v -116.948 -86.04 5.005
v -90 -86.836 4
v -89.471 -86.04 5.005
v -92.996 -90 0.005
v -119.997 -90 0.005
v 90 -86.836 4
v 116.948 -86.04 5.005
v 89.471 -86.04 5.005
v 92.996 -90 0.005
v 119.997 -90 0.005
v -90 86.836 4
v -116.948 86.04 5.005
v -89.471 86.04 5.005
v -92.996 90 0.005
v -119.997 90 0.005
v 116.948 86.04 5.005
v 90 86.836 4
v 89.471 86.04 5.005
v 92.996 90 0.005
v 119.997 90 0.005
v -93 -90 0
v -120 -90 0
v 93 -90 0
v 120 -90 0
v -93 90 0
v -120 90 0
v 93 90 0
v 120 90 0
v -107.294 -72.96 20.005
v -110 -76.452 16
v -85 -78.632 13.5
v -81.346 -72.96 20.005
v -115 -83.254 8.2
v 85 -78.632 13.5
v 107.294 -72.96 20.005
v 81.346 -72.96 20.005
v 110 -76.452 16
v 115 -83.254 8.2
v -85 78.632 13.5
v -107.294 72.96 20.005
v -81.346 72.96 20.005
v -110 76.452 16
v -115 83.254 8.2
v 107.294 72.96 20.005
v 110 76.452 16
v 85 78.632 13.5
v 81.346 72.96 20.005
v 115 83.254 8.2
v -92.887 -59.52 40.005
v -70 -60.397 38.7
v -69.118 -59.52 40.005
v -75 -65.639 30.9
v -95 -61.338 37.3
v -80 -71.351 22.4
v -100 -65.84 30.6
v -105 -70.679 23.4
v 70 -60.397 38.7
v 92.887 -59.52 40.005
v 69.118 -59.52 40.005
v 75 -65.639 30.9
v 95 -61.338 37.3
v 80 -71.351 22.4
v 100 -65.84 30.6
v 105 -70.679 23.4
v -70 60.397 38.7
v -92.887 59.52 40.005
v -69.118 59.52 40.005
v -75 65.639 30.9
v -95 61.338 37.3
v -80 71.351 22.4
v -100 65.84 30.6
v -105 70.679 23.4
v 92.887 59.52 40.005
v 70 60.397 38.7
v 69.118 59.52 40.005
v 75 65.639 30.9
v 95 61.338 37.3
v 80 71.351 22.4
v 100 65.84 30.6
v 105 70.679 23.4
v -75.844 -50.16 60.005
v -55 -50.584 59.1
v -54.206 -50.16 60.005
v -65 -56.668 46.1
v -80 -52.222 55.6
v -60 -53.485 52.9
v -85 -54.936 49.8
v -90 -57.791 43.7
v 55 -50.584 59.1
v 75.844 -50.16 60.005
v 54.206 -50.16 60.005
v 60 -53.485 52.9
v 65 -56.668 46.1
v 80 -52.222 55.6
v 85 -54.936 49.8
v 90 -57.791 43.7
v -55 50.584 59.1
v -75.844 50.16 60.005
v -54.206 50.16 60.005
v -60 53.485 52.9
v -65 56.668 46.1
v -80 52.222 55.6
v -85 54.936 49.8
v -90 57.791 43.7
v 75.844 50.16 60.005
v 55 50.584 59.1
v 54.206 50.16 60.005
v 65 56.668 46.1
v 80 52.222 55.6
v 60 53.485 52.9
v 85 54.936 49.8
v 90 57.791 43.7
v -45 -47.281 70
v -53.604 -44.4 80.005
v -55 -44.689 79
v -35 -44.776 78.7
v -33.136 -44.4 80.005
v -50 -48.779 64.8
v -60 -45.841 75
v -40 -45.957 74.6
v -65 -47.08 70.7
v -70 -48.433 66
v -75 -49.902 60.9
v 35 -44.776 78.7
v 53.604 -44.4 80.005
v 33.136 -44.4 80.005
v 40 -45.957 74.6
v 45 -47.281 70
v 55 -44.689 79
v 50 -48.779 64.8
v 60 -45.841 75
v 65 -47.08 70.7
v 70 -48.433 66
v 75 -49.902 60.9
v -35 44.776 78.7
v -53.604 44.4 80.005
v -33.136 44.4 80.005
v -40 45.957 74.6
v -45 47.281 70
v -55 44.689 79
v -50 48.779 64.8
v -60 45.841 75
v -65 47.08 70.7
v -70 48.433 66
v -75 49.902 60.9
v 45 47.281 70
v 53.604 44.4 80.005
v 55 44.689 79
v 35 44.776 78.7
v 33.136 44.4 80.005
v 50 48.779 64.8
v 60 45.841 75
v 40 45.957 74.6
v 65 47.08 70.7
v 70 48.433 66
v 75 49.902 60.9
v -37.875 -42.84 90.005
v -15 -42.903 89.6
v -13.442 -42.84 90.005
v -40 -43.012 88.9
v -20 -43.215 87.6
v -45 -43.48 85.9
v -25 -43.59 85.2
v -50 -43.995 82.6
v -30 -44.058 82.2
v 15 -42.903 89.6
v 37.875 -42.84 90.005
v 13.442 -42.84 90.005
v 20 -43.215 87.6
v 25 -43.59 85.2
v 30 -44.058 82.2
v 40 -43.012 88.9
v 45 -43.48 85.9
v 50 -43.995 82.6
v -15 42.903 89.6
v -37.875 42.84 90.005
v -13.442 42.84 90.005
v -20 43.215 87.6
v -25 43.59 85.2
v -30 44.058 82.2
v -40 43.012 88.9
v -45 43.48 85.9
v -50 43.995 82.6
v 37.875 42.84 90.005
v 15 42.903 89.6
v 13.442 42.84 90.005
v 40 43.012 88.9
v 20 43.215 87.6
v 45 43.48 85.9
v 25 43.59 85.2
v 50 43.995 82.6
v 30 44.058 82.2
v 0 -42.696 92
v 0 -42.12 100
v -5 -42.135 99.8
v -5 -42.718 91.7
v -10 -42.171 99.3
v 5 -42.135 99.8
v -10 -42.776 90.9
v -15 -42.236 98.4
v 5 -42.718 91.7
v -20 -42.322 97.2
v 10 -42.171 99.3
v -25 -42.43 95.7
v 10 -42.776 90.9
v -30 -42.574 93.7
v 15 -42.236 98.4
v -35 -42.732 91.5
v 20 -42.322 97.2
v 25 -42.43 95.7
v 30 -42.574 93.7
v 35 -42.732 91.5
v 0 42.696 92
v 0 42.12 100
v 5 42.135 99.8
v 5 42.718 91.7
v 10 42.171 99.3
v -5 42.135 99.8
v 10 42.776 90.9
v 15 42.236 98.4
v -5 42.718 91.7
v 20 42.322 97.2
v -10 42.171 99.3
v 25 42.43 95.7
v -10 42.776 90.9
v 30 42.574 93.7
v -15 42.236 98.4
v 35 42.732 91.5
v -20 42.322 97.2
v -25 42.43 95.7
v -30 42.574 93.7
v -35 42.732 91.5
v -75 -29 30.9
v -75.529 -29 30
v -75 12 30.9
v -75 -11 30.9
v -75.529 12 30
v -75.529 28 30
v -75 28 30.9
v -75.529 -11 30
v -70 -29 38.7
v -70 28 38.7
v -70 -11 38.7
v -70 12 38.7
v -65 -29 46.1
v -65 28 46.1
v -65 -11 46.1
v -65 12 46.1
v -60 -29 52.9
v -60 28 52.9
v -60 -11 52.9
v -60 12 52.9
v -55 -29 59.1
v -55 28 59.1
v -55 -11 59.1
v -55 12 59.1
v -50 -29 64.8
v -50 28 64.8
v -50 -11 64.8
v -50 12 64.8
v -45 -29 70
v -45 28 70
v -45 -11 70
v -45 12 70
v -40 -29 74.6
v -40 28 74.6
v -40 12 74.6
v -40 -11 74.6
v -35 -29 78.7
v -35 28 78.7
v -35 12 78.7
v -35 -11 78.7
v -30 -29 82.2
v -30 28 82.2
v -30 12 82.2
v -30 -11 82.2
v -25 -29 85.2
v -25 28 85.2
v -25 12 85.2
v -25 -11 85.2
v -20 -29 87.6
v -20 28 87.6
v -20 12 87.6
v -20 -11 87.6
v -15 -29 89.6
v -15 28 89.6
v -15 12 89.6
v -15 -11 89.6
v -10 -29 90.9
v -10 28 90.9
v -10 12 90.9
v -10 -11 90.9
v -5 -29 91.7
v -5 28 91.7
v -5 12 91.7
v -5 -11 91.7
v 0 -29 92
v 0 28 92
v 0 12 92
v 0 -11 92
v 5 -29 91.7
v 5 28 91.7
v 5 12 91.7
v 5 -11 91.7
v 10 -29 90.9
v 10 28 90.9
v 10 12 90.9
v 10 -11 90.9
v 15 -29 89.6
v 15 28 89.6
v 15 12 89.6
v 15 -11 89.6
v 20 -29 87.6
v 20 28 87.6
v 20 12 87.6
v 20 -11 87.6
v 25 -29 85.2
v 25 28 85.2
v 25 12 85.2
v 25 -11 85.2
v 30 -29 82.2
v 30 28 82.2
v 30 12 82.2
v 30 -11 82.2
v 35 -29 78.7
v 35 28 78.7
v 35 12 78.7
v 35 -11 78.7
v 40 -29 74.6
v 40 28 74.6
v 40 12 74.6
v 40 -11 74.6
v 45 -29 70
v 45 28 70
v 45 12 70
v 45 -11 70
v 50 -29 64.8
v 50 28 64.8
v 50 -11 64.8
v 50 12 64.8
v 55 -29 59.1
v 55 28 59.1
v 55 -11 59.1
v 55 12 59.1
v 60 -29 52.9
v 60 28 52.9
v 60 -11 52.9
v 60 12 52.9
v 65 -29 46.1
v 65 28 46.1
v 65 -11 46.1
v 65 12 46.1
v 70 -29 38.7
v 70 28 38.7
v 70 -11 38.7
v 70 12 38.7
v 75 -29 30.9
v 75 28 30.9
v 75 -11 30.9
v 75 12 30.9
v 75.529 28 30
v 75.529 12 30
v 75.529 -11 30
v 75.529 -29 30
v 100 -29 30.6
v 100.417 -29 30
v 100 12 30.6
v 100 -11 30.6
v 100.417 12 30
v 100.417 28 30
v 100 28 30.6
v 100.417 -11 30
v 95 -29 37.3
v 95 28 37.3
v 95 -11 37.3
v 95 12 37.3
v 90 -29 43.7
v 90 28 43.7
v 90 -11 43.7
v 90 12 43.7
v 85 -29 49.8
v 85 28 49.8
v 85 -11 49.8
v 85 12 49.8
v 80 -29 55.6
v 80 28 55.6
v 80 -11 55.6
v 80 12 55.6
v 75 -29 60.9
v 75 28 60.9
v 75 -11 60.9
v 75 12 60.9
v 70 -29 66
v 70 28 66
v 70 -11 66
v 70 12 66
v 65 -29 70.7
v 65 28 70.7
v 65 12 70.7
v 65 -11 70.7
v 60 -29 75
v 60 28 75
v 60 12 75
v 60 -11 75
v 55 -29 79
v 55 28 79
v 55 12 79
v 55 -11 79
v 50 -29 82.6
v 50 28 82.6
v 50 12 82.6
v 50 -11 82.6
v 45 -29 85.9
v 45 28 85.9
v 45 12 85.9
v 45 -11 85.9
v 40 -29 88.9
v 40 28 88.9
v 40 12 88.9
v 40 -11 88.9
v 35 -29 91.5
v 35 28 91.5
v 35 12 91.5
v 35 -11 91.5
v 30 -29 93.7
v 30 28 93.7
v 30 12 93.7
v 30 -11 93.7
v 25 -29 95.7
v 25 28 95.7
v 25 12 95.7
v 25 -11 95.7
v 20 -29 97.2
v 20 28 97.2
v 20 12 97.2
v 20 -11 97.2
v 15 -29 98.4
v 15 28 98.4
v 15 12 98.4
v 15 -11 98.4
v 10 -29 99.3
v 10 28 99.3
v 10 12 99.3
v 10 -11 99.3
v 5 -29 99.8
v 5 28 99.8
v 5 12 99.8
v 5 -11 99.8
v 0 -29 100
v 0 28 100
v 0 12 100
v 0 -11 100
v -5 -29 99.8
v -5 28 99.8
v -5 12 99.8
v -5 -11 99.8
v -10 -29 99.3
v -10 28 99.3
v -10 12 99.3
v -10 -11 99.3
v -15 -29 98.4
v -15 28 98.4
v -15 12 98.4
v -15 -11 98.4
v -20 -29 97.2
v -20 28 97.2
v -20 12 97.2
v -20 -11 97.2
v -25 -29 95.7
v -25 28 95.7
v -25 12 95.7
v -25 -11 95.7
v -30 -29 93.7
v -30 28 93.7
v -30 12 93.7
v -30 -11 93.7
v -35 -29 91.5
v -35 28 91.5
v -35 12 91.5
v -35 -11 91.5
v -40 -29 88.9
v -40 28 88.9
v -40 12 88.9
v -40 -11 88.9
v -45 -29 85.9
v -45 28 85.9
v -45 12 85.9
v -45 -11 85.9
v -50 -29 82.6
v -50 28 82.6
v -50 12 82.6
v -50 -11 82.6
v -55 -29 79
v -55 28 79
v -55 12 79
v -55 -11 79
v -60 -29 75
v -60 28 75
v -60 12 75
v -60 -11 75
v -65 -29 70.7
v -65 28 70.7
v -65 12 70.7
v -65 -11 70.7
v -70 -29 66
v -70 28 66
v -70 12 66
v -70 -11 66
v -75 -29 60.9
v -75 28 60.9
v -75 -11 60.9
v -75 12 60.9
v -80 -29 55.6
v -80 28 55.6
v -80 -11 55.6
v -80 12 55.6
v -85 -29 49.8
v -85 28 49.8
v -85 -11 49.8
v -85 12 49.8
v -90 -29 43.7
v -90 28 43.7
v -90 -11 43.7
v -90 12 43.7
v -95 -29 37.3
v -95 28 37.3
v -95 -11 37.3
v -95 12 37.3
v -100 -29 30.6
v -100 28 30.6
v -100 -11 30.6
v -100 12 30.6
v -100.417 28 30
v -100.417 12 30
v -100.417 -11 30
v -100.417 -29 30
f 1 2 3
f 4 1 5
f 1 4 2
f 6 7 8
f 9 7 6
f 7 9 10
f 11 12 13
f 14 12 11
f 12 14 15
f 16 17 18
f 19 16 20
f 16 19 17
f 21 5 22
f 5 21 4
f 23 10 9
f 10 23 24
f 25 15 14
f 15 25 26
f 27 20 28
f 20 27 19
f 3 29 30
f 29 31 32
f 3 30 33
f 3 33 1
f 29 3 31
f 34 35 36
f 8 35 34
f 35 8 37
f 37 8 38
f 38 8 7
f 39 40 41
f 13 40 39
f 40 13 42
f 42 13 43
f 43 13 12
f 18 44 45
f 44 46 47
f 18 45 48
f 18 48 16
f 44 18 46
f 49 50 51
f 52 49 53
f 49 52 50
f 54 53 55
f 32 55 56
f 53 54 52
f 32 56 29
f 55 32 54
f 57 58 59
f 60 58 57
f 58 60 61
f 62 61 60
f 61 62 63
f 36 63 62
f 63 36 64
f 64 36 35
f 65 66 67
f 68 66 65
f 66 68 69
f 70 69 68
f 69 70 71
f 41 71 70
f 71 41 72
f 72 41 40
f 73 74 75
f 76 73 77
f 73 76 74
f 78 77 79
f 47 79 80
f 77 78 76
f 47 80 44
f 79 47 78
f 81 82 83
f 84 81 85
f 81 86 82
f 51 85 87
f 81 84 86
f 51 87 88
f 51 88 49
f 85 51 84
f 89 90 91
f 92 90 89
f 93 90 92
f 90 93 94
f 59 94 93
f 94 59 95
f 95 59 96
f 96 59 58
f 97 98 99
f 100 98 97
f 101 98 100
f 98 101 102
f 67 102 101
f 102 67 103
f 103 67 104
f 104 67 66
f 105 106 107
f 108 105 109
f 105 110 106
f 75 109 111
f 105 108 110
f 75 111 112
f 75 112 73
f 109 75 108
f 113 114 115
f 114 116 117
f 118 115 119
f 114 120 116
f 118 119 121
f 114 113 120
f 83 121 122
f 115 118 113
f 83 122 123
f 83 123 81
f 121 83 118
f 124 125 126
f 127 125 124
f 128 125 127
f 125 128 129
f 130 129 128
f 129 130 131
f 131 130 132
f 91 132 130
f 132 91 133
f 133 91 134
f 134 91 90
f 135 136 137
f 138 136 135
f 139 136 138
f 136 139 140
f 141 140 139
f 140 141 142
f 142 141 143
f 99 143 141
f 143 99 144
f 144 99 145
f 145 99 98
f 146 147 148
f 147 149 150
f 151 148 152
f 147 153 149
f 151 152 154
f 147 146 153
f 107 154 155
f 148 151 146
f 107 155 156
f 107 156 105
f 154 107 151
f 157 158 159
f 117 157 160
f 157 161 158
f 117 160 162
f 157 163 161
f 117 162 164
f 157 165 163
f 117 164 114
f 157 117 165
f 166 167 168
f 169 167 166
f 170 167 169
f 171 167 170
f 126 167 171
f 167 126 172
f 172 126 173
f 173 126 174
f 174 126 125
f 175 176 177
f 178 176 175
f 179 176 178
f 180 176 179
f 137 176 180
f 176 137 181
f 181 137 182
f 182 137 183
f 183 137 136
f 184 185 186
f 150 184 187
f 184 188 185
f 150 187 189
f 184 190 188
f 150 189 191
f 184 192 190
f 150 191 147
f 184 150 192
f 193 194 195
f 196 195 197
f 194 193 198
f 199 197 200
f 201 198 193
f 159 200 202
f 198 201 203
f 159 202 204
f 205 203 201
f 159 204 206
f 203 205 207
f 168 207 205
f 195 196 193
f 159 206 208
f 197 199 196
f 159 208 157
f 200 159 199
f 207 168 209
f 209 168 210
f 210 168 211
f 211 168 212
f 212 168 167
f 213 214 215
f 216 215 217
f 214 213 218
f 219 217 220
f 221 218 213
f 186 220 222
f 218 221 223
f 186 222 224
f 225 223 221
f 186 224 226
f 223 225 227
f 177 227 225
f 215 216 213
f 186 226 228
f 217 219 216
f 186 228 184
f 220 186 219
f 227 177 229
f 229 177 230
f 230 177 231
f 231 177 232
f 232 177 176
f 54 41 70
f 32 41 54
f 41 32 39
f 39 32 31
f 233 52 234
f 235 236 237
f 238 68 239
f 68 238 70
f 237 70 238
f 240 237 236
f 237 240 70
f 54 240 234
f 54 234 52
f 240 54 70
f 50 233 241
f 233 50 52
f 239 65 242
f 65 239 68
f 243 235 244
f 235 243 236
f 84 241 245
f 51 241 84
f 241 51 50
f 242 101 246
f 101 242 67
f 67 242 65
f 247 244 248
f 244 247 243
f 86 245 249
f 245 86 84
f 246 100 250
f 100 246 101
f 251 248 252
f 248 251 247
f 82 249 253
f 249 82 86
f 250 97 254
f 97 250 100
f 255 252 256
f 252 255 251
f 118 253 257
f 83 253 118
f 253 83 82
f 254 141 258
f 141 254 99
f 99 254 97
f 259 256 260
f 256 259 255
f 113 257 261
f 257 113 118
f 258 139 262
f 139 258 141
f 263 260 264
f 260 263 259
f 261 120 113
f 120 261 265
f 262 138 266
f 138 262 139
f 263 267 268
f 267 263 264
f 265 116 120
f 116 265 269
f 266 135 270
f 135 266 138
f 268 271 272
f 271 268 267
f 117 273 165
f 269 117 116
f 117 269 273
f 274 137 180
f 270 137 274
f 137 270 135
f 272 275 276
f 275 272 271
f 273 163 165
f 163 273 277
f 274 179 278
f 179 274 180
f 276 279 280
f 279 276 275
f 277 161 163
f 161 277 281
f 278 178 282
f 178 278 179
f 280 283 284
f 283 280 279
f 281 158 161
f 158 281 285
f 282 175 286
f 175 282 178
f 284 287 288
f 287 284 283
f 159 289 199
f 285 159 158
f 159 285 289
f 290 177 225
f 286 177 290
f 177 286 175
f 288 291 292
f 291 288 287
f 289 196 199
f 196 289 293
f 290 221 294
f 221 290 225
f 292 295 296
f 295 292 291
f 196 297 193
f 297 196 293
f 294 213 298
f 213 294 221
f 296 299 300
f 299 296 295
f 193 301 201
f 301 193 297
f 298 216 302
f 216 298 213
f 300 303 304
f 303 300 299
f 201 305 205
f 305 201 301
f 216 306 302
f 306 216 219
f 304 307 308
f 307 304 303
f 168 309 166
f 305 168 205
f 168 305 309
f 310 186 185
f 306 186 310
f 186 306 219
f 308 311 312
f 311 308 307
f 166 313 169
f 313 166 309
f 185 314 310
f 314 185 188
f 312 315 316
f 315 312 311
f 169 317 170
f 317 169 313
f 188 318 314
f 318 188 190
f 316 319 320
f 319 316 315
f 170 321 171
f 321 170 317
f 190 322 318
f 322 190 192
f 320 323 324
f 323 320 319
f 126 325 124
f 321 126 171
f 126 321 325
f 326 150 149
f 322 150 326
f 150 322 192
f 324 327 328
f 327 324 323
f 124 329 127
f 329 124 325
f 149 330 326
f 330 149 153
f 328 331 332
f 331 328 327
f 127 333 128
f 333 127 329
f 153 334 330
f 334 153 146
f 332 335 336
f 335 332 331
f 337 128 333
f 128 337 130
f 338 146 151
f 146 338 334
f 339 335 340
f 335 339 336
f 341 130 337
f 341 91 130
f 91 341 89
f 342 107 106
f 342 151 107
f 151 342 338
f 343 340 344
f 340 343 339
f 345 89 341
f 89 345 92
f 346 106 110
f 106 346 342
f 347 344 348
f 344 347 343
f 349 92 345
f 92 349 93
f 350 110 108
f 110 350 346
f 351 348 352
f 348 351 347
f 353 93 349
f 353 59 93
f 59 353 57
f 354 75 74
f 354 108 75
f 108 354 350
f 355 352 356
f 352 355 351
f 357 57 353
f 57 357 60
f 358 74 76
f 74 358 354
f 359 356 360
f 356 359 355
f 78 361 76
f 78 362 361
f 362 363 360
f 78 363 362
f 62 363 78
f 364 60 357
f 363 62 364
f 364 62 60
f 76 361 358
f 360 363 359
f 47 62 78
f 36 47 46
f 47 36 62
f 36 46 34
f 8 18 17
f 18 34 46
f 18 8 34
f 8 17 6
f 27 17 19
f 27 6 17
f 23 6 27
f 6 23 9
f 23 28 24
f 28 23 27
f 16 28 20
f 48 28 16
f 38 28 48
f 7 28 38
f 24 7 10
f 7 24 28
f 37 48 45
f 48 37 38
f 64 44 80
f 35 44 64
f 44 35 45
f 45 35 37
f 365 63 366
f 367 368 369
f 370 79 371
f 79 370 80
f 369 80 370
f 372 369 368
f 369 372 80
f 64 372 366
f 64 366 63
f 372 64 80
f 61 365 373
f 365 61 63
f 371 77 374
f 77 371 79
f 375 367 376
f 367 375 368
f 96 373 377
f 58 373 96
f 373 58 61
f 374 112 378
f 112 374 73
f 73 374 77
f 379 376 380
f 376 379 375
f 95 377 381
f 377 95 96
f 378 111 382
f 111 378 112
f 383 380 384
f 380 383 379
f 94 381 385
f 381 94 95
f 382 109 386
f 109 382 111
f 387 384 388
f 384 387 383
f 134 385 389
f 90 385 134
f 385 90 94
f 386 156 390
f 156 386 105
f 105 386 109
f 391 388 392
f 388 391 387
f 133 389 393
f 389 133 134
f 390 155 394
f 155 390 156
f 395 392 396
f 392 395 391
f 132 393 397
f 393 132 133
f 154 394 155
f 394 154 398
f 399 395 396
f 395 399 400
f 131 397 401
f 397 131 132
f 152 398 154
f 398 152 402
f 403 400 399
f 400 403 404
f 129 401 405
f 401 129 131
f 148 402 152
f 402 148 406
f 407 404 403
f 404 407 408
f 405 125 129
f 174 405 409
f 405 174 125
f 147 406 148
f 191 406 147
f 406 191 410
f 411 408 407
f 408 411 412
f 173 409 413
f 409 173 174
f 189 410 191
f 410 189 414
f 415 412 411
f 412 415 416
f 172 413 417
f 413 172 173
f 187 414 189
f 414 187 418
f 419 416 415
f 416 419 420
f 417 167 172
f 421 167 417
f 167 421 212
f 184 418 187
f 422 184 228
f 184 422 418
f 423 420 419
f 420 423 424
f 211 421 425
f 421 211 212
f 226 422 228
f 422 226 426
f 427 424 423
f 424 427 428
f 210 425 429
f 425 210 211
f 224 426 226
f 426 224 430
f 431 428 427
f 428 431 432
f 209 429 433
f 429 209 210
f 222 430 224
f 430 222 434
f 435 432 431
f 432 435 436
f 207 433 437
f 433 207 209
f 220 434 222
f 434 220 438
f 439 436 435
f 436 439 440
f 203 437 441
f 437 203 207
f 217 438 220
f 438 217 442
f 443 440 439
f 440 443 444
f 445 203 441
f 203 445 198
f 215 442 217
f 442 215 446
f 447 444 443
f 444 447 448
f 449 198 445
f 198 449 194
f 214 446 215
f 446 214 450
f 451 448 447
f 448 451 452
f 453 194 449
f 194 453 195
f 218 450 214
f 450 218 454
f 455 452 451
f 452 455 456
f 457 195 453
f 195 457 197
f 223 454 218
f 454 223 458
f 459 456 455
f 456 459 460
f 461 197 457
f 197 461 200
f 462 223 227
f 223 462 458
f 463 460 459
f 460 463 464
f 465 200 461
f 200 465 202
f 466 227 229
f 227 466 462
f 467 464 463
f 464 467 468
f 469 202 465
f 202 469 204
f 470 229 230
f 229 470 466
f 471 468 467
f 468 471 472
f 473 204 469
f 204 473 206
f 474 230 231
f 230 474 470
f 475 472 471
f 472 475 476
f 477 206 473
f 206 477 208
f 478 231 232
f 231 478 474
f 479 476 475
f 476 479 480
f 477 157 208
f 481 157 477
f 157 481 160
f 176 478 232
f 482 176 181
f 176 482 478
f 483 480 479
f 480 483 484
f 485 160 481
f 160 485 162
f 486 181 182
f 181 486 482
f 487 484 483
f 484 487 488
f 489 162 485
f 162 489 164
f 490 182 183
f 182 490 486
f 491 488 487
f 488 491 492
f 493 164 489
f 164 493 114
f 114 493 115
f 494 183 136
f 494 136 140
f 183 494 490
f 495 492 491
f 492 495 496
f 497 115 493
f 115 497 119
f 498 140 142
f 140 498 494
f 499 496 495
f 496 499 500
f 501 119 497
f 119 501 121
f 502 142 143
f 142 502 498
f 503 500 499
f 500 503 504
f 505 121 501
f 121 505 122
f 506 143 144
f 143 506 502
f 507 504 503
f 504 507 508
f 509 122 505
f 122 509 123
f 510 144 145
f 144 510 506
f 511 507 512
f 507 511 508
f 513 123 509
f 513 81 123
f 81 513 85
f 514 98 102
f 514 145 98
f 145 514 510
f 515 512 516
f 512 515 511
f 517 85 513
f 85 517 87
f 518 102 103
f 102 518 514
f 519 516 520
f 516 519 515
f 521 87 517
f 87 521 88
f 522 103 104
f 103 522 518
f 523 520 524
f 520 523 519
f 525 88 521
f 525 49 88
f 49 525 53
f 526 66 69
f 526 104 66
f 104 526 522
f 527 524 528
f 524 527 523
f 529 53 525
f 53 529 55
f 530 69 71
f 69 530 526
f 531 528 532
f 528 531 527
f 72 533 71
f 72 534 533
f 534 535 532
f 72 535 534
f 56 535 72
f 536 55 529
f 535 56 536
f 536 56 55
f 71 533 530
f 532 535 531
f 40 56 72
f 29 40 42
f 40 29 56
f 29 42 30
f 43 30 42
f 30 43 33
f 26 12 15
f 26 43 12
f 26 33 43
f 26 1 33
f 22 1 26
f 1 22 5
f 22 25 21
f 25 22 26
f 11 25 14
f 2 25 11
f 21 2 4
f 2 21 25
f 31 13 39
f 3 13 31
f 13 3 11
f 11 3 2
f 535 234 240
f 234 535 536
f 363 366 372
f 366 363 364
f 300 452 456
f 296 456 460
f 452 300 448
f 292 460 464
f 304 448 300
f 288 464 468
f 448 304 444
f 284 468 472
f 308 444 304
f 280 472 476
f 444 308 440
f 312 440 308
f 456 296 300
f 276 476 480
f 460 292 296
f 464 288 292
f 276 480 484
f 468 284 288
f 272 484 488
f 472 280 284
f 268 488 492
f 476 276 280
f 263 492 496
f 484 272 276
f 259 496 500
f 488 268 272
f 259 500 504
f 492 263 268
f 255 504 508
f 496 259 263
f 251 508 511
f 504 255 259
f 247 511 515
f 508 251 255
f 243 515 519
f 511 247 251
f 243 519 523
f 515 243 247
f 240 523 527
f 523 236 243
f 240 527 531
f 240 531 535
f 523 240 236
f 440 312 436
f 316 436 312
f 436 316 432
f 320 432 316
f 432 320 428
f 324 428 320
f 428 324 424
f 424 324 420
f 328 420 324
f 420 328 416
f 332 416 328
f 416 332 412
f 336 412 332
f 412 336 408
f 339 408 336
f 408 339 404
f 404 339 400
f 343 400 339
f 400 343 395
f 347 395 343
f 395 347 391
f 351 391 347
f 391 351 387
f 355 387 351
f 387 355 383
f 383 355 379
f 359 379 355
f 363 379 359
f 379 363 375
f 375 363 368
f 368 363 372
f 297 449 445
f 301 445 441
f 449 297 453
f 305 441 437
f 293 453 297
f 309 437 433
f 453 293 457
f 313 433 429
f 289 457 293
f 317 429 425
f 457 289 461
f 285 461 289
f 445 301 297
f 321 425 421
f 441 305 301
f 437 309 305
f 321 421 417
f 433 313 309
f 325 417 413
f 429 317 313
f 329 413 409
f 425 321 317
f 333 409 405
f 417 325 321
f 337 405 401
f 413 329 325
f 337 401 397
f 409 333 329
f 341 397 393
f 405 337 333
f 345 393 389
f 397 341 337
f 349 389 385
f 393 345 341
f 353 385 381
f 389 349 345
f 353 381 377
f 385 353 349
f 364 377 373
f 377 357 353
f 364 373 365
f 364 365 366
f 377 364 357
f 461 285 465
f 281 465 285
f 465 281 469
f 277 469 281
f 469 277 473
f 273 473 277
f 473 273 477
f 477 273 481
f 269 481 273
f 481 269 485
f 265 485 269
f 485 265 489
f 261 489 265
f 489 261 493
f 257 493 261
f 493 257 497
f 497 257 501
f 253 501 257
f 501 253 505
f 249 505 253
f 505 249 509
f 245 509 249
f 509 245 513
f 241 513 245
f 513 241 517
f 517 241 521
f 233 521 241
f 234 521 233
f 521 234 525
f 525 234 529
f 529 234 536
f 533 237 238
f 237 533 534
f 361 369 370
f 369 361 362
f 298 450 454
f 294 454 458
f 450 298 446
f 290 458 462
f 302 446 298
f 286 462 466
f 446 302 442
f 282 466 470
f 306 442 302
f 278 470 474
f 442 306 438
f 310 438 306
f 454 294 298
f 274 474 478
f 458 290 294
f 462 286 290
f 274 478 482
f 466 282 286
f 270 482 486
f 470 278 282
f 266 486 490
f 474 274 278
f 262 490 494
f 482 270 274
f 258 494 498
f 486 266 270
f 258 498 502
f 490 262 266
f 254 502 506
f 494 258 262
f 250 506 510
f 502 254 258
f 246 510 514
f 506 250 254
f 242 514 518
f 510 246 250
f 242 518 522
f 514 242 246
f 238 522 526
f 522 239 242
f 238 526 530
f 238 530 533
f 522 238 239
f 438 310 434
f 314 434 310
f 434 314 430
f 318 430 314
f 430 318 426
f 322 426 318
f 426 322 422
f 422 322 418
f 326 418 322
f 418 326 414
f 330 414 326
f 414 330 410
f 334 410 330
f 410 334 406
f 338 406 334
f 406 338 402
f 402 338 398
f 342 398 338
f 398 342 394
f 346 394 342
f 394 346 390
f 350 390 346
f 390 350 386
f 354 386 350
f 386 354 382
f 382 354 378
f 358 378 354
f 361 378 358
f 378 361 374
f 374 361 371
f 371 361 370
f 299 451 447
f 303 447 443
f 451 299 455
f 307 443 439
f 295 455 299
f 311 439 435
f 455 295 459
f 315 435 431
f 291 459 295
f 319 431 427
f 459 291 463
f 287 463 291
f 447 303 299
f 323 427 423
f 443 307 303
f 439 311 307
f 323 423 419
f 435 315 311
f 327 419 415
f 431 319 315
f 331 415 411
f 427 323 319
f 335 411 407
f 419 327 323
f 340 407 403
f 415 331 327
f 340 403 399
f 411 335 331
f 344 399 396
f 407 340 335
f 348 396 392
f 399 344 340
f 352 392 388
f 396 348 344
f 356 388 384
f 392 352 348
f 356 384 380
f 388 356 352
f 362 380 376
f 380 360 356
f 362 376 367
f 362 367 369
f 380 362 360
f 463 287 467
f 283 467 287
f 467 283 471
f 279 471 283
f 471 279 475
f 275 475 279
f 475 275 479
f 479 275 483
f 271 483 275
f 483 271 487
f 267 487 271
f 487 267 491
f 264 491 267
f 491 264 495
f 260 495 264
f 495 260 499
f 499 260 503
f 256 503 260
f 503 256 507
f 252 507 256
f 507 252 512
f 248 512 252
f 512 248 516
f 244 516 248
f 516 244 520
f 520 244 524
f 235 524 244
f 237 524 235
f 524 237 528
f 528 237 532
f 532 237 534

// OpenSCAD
// =====================================
// Elegant Arch Dual Laptop Stand
// A swept arch into which two closed laptops slide edge-down, side by side.
// Each slot is a flat-floored channel cut straight DOWN from the crest: the
// laptop's bottom edge seats on a level floor (an XY face) between two
// vertical side walls, rather than a groove that follows the curved arch band.
// Same arch profiles as laptop_stand.scad (sampled from
// elegant-arch-macbookpro-stand.stl), scaled to a deeper base so two slots
// and a divider wall fit side by side.
//
// Coordinate system: Z up, base on Z=0. X = width (foot-to-foot),
// Y = depth (front-to-back), slots run along X.
// Upright/symmetric model — no viewer rotation (prints base-down).
// =====================================

$fn = 64;

// === Parameters (mm) ===
slot_gap_1   = 18;    // front slot width — laptop 1 thickness + clearance
slot_gap_2   = 16;    // rear slot width  — laptop 2 thickness + clearance
slot_spacing = 40;    // centre-to-centre distance between the two slots (Y)
groove_depth = 70;    // how deep each laptop sinks into the arch band
stand_width  = 240;   // overall width, foot-to-foot (X)
stand_depth  = 180;   // overall depth at the base, front-to-back (Y)
stand_height = 100;   // overall height (Z)

// === Derived scale factors ===
// Arch profiles below are sampled at the reference size 240 x 150 x 100.
sx = stand_width  / 240;   // X scale
sy = stand_depth  / 150;   // Y (depth) scale
sz = stand_height / 100;   // Z scale

// Run the slot wider than the arch (full width = stand_width) so it always
// spans the whole crest, with no un-slotted band left at the shoulders. The
// feet sit below the slot floor, so the overhang never touches them.
slot_length  = stand_width + 20;

// === Sampled arch profiles (reference 240w x 100h), x = 0 .. 120 ===
// Outer silhouette: the dome top edge (front view).
outer_half = [
    [0,100.0],[5,99.8],[10,99.3],[15,98.4],[20,97.2],[25,95.7],[30,93.7],
    [35,91.5],[40,88.9],[45,85.9],[50,82.6],[55,79.0],[60,75.0],[65,70.7],
    [70,66.0],[75,60.9],[80,55.6],[85,49.8],[90,43.7],[95,37.3],[100,30.6],
    [105,23.4],[110,16.0],[115,8.2],[120,0.0]
];
// Inner silhouette: the underside of the arch opening.
inner_half = [
    [0,92.0],[5,91.7],[10,90.9],[15,89.6],[20,87.6],[25,85.2],[30,82.2],
    [35,78.7],[40,74.6],[45,70.0],[50,64.8],[55,59.1],[60,52.9],[65,46.1],
    [70,38.7],[75,30.9],[80,22.4],[85,13.5],[90,4.0],[93,0.0]
];
// Depth taper: half-depth (|Y|) of the body vs. height. Gives the scalloped
// front/back faces — wide at the base, narrowing toward the crown.
depth_half = [
    [0,75.0],[5,71.7],[20,60.8],[40,49.6],[60,41.8],[80,37.0],[90,35.7],[100,35.1]
];

// Build a full symmetric profile (x = -120 .. 120) from a positive-x half,
// scaled to the requested width/height.
function mirror_profile(half) =
    concat(
        [ for (i = [len(half)-1 : -1 : 1]) [-half[i][0]*sx, half[i][1]*sz] ],
        [ for (p = half) [p[0]*sx, p[1]*sz] ]
    );

// Filled dome silhouette (outer edge only).
module outer_2d() { polygon(mirror_profile(outer_half)); }

// === 2D arch band: filled dome minus the underside opening ===
module arch_2d() {
    difference() {
        outer_2d();
        polygon(mirror_profile(inner_half));
    }
}

// === Depth-taper mask: tapered slab stack spanning the full width ===
module depth_mask() {
    w = stand_width + 2;
    for (i = [0 : len(depth_half)-2]) {
        z0 = depth_half[i][0]   * sz;  hd0 = depth_half[i][1]   * sy;
        z1 = depth_half[i+1][0] * sz;  hd1 = depth_half[i+1][1] * sy;
        hull() {
            translate([0, 0, z0]) cube([w, 2*hd0, 0.01], center = true);
            translate([0, 0, z1]) cube([w, 2*hd1, 0.01], center = true);
        }
    }
}

// === Two laptop slots — parallel flat-floored channels cut into the arch band ===
// Same construction as the single-slot stand, duplicated at two Y offsets. The
// front slot is centred at Y = -slot_spacing/2, the rear at Y = +slot_spacing/2,
// leaving a solid divider wall between them.
module slot_cut() {
    floor_z = stand_height - groove_depth;   // height of the flat seating floor
    h       = stand_height + 2 - floor_z;

    // Front slot (laptop 1)
    translate([-slot_length/2, -slot_spacing/2 - slot_gap_1/2, floor_z])
        cube([slot_length, slot_gap_1, h]);

    // Rear slot (laptop 2)
    translate([-slot_length/2, slot_spacing/2 - slot_gap_2/2, floor_z])
        cube([slot_length, slot_gap_2, h]);
}

// === Assembly ===
module dual_laptop_stand() {
    difference() {
        intersection() {
            rotate([90, 0, 0])
                linear_extrude(height = stand_depth + 2, center = true)
                    arch_2d();
            depth_mask();
        }
        slot_cut();
    }
}

dual_laptop_stand();
